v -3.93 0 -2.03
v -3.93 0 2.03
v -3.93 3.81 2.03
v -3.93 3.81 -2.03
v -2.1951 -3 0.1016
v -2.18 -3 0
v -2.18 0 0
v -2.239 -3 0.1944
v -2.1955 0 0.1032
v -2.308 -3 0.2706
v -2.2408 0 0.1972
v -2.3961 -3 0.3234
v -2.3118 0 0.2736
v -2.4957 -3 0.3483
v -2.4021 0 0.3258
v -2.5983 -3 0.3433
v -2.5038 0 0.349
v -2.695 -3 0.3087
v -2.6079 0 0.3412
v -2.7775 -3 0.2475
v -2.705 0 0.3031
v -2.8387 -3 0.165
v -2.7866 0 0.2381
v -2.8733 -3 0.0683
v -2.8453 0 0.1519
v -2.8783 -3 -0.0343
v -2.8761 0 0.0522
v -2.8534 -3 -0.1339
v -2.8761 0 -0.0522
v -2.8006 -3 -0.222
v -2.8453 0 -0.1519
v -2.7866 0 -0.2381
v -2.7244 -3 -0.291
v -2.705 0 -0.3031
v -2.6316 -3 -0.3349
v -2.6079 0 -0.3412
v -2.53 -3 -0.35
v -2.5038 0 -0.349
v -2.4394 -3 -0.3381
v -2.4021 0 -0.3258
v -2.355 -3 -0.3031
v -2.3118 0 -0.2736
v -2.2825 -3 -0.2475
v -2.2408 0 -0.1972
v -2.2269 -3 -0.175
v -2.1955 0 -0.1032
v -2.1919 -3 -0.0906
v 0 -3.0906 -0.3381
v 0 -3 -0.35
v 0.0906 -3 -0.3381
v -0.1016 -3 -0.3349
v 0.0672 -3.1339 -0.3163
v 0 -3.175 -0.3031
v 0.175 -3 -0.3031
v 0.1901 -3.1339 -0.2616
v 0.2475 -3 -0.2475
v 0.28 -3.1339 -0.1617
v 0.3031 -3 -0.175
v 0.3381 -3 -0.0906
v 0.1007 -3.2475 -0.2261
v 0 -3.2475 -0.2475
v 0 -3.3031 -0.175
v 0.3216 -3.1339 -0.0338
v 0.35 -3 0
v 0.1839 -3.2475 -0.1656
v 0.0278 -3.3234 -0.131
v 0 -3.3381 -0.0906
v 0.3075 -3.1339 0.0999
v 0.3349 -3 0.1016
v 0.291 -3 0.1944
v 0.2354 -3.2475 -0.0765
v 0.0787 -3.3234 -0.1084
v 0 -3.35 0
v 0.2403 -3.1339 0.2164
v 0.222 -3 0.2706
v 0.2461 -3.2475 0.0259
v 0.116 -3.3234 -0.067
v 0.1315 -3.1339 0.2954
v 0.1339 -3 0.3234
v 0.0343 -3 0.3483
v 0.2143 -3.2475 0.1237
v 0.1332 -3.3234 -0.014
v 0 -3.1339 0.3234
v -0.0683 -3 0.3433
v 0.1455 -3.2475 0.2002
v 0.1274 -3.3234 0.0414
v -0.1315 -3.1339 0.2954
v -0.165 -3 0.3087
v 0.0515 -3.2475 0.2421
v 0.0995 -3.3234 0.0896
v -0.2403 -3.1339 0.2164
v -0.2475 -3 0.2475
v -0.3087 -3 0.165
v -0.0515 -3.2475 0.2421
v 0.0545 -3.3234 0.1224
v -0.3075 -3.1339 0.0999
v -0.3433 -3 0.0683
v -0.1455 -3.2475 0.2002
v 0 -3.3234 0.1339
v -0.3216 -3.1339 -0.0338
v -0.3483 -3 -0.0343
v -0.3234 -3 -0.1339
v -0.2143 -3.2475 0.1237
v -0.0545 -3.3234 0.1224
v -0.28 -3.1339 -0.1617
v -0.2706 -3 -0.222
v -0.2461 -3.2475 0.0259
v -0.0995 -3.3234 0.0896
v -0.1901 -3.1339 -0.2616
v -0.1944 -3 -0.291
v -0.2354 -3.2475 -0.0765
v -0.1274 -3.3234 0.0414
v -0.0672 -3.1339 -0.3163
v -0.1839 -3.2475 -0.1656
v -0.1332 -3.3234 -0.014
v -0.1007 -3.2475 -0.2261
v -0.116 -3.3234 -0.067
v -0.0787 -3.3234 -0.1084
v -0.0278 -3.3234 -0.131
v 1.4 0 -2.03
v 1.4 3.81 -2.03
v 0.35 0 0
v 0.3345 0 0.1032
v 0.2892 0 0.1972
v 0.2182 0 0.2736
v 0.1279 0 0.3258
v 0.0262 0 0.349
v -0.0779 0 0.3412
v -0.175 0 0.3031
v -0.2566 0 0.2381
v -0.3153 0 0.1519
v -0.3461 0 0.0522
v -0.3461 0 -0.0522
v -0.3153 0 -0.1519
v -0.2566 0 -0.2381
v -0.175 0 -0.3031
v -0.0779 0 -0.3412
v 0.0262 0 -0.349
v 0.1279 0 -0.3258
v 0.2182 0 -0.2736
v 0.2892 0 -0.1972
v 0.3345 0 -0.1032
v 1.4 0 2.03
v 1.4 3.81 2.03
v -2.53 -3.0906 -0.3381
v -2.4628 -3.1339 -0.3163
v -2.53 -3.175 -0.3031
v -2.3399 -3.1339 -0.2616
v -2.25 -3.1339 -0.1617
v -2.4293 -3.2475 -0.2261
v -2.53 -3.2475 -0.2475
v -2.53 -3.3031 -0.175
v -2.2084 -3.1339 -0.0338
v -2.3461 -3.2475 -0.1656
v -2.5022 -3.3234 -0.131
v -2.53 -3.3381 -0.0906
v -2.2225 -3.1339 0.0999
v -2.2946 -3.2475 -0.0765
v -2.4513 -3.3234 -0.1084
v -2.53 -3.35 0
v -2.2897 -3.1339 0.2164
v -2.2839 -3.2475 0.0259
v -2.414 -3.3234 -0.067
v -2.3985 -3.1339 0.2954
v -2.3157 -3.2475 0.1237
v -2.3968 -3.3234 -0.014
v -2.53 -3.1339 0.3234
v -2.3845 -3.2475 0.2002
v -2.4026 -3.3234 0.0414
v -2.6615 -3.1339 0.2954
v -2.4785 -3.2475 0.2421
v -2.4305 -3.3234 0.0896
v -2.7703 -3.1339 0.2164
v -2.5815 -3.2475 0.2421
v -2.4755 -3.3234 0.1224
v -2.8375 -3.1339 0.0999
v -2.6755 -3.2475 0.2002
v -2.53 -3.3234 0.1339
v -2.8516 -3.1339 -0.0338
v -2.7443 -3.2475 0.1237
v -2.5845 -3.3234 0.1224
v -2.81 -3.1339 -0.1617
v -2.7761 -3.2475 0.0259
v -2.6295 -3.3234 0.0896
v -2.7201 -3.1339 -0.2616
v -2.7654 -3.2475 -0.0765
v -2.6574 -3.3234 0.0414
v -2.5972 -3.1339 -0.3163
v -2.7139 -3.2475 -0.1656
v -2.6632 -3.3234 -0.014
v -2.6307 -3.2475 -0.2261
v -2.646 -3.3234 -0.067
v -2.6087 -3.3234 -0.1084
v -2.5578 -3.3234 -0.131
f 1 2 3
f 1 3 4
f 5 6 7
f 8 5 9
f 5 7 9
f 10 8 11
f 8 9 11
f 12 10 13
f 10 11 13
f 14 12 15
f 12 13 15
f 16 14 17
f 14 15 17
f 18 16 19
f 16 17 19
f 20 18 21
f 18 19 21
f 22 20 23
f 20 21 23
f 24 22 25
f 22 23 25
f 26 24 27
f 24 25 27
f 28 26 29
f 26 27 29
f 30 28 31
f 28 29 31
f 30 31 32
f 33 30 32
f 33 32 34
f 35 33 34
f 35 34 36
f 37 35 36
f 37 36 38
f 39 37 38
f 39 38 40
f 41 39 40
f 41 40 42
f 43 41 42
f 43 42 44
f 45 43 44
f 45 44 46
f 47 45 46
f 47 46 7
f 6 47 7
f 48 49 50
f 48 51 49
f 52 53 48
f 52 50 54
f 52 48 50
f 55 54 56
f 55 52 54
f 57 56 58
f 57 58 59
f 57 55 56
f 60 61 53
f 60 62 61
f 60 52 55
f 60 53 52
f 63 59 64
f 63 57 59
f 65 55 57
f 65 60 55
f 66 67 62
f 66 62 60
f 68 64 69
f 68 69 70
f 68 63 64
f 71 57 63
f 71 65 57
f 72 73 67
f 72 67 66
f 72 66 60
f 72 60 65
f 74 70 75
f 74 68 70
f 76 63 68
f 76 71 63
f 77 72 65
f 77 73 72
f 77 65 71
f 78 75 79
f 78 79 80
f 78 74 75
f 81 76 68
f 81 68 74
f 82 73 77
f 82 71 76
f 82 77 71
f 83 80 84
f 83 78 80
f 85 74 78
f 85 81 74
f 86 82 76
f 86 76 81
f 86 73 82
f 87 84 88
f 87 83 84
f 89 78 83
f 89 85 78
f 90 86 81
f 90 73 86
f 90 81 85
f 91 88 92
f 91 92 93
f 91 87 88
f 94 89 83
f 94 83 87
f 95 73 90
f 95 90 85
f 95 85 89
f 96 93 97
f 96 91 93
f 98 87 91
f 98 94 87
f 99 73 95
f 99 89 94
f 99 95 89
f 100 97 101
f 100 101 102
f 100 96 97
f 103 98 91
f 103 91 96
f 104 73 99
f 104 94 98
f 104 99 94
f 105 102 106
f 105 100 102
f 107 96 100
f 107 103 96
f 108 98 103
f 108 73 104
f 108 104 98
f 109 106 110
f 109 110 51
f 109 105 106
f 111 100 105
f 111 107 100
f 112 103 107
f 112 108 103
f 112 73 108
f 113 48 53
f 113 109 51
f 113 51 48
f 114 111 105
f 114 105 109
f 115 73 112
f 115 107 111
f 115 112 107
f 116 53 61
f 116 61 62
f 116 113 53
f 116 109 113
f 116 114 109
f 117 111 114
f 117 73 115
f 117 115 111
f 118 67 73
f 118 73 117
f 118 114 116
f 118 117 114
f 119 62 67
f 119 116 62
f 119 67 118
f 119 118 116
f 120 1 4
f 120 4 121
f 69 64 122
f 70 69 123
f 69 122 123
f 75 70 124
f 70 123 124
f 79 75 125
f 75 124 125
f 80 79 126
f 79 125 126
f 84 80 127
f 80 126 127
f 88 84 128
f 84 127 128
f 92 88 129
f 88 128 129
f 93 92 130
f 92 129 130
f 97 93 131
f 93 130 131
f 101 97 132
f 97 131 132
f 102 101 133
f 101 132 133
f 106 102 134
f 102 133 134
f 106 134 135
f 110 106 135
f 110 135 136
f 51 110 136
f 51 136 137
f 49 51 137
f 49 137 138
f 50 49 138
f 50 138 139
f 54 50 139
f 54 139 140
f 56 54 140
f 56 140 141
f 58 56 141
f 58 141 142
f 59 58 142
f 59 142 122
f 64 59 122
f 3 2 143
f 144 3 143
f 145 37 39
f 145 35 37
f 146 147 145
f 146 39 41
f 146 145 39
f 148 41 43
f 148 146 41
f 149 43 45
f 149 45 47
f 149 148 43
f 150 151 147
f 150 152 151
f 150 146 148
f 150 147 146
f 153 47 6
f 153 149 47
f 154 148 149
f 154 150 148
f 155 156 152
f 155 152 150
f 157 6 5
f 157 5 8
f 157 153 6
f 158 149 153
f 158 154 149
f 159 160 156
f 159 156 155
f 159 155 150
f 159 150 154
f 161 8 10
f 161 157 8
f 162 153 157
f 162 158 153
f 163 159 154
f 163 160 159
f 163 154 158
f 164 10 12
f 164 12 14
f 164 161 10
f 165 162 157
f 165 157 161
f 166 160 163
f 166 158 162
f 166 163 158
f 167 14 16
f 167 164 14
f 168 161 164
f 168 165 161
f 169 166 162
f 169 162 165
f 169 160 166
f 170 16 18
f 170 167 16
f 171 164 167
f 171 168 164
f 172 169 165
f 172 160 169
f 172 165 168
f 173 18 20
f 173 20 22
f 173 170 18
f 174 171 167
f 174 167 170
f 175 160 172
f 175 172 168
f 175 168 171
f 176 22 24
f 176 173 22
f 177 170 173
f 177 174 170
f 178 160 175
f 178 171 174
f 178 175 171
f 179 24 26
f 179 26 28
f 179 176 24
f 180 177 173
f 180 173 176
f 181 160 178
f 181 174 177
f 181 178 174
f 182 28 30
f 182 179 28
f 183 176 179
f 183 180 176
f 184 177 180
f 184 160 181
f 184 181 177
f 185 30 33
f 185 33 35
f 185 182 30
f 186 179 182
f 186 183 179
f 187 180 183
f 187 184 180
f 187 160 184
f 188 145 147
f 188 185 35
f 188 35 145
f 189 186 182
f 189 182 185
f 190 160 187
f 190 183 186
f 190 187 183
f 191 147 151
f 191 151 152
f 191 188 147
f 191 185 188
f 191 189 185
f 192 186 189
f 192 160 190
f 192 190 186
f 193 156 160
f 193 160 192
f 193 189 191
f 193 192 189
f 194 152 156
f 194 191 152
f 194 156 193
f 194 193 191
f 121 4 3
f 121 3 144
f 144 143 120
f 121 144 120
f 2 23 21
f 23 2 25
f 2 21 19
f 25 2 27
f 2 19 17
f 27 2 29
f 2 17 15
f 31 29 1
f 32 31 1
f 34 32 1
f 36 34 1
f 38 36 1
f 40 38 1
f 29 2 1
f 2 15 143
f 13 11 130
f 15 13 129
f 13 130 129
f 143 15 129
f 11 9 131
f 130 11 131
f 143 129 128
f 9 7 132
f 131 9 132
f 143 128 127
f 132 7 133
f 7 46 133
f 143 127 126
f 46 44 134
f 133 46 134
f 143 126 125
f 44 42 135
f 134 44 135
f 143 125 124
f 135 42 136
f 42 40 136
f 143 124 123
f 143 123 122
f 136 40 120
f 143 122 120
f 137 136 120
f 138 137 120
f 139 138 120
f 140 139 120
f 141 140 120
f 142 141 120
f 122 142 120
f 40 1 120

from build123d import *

# Parameters (mm, degrees)
SKETCH1_W           = 5.33
SKETCH1_H           = 4.06
BASE_EXTRUDE_DEPTH  = 3.81
SKETCH2_R           = 0.35
BOSS_EXTRUDE1_DEPTH = 3
DOME1_FACE_RADIUS   = 0.35
DOME1_HEIGHT        = 0.35
DOME2_FACE_RADIUS   = 0.35
DOME2_HEIGHT        = 0.35


with BuildPart() as part:
    # Sketch1 → Base-Extrude (new body)
    with BuildSketch(Plane(origin=(0, 0, 0), x_dir=(1, 0, 0), z_dir=(0, 1, 0))):
        with Locations((-1.265, 0)):
            Rectangle(SKETCH1_W, SKETCH1_H)
    extrude(amount=BASE_EXTRUDE_DEPTH)

    # Sketch2 → Boss-Extrude1 (add)
    with BuildSketch(Plane.XZ):
        Circle(SKETCH2_R)
        with Locations((-2.53, 0)):
            Circle(SKETCH2_R)
    extrude(amount=BOSS_EXTRUDE1_DEPTH)

    # Dome1: a dome of height H over a round flat face of radius A is a cap of a sphere of radius (A * A + H * H) / (2 * H)
    dome1_r = (DOME1_FACE_RADIUS * DOME1_FACE_RADIUS + DOME1_HEIGHT * DOME1_HEIGHT) / (2 * DOME1_HEIGHT)
    dome1_base = Plane((0, -3, 0), z_dir=(0, -1, 0))
    with Locations(dome1_base.offset(DOME1_HEIGHT - dome1_r)):
        dome1_ball = Sphere(dome1_r, mode=Mode.PRIVATE)
    add(split(dome1_ball, bisect_by=dome1_base, keep=Keep.TOP, mode=Mode.PRIVATE))

    # Dome2: a dome of height H over a round flat face of radius A is a cap of a sphere of radius (A * A + H * H) / (2 * H)
    dome2_r = (DOME2_FACE_RADIUS * DOME2_FACE_RADIUS + DOME2_HEIGHT * DOME2_HEIGHT) / (2 * DOME2_HEIGHT)
    dome2_base = Plane((-2.53, -3, 0), z_dir=(0, -1, 0))
    with Locations(dome2_base.offset(DOME2_HEIGHT - dome2_r)):
        dome2_ball = Sphere(dome2_r, mode=Mode.PRIVATE)
    add(split(dome2_ball, bisect_by=dome2_base, keep=Keep.TOP, mode=Mode.PRIVATE))


solid = part.part
